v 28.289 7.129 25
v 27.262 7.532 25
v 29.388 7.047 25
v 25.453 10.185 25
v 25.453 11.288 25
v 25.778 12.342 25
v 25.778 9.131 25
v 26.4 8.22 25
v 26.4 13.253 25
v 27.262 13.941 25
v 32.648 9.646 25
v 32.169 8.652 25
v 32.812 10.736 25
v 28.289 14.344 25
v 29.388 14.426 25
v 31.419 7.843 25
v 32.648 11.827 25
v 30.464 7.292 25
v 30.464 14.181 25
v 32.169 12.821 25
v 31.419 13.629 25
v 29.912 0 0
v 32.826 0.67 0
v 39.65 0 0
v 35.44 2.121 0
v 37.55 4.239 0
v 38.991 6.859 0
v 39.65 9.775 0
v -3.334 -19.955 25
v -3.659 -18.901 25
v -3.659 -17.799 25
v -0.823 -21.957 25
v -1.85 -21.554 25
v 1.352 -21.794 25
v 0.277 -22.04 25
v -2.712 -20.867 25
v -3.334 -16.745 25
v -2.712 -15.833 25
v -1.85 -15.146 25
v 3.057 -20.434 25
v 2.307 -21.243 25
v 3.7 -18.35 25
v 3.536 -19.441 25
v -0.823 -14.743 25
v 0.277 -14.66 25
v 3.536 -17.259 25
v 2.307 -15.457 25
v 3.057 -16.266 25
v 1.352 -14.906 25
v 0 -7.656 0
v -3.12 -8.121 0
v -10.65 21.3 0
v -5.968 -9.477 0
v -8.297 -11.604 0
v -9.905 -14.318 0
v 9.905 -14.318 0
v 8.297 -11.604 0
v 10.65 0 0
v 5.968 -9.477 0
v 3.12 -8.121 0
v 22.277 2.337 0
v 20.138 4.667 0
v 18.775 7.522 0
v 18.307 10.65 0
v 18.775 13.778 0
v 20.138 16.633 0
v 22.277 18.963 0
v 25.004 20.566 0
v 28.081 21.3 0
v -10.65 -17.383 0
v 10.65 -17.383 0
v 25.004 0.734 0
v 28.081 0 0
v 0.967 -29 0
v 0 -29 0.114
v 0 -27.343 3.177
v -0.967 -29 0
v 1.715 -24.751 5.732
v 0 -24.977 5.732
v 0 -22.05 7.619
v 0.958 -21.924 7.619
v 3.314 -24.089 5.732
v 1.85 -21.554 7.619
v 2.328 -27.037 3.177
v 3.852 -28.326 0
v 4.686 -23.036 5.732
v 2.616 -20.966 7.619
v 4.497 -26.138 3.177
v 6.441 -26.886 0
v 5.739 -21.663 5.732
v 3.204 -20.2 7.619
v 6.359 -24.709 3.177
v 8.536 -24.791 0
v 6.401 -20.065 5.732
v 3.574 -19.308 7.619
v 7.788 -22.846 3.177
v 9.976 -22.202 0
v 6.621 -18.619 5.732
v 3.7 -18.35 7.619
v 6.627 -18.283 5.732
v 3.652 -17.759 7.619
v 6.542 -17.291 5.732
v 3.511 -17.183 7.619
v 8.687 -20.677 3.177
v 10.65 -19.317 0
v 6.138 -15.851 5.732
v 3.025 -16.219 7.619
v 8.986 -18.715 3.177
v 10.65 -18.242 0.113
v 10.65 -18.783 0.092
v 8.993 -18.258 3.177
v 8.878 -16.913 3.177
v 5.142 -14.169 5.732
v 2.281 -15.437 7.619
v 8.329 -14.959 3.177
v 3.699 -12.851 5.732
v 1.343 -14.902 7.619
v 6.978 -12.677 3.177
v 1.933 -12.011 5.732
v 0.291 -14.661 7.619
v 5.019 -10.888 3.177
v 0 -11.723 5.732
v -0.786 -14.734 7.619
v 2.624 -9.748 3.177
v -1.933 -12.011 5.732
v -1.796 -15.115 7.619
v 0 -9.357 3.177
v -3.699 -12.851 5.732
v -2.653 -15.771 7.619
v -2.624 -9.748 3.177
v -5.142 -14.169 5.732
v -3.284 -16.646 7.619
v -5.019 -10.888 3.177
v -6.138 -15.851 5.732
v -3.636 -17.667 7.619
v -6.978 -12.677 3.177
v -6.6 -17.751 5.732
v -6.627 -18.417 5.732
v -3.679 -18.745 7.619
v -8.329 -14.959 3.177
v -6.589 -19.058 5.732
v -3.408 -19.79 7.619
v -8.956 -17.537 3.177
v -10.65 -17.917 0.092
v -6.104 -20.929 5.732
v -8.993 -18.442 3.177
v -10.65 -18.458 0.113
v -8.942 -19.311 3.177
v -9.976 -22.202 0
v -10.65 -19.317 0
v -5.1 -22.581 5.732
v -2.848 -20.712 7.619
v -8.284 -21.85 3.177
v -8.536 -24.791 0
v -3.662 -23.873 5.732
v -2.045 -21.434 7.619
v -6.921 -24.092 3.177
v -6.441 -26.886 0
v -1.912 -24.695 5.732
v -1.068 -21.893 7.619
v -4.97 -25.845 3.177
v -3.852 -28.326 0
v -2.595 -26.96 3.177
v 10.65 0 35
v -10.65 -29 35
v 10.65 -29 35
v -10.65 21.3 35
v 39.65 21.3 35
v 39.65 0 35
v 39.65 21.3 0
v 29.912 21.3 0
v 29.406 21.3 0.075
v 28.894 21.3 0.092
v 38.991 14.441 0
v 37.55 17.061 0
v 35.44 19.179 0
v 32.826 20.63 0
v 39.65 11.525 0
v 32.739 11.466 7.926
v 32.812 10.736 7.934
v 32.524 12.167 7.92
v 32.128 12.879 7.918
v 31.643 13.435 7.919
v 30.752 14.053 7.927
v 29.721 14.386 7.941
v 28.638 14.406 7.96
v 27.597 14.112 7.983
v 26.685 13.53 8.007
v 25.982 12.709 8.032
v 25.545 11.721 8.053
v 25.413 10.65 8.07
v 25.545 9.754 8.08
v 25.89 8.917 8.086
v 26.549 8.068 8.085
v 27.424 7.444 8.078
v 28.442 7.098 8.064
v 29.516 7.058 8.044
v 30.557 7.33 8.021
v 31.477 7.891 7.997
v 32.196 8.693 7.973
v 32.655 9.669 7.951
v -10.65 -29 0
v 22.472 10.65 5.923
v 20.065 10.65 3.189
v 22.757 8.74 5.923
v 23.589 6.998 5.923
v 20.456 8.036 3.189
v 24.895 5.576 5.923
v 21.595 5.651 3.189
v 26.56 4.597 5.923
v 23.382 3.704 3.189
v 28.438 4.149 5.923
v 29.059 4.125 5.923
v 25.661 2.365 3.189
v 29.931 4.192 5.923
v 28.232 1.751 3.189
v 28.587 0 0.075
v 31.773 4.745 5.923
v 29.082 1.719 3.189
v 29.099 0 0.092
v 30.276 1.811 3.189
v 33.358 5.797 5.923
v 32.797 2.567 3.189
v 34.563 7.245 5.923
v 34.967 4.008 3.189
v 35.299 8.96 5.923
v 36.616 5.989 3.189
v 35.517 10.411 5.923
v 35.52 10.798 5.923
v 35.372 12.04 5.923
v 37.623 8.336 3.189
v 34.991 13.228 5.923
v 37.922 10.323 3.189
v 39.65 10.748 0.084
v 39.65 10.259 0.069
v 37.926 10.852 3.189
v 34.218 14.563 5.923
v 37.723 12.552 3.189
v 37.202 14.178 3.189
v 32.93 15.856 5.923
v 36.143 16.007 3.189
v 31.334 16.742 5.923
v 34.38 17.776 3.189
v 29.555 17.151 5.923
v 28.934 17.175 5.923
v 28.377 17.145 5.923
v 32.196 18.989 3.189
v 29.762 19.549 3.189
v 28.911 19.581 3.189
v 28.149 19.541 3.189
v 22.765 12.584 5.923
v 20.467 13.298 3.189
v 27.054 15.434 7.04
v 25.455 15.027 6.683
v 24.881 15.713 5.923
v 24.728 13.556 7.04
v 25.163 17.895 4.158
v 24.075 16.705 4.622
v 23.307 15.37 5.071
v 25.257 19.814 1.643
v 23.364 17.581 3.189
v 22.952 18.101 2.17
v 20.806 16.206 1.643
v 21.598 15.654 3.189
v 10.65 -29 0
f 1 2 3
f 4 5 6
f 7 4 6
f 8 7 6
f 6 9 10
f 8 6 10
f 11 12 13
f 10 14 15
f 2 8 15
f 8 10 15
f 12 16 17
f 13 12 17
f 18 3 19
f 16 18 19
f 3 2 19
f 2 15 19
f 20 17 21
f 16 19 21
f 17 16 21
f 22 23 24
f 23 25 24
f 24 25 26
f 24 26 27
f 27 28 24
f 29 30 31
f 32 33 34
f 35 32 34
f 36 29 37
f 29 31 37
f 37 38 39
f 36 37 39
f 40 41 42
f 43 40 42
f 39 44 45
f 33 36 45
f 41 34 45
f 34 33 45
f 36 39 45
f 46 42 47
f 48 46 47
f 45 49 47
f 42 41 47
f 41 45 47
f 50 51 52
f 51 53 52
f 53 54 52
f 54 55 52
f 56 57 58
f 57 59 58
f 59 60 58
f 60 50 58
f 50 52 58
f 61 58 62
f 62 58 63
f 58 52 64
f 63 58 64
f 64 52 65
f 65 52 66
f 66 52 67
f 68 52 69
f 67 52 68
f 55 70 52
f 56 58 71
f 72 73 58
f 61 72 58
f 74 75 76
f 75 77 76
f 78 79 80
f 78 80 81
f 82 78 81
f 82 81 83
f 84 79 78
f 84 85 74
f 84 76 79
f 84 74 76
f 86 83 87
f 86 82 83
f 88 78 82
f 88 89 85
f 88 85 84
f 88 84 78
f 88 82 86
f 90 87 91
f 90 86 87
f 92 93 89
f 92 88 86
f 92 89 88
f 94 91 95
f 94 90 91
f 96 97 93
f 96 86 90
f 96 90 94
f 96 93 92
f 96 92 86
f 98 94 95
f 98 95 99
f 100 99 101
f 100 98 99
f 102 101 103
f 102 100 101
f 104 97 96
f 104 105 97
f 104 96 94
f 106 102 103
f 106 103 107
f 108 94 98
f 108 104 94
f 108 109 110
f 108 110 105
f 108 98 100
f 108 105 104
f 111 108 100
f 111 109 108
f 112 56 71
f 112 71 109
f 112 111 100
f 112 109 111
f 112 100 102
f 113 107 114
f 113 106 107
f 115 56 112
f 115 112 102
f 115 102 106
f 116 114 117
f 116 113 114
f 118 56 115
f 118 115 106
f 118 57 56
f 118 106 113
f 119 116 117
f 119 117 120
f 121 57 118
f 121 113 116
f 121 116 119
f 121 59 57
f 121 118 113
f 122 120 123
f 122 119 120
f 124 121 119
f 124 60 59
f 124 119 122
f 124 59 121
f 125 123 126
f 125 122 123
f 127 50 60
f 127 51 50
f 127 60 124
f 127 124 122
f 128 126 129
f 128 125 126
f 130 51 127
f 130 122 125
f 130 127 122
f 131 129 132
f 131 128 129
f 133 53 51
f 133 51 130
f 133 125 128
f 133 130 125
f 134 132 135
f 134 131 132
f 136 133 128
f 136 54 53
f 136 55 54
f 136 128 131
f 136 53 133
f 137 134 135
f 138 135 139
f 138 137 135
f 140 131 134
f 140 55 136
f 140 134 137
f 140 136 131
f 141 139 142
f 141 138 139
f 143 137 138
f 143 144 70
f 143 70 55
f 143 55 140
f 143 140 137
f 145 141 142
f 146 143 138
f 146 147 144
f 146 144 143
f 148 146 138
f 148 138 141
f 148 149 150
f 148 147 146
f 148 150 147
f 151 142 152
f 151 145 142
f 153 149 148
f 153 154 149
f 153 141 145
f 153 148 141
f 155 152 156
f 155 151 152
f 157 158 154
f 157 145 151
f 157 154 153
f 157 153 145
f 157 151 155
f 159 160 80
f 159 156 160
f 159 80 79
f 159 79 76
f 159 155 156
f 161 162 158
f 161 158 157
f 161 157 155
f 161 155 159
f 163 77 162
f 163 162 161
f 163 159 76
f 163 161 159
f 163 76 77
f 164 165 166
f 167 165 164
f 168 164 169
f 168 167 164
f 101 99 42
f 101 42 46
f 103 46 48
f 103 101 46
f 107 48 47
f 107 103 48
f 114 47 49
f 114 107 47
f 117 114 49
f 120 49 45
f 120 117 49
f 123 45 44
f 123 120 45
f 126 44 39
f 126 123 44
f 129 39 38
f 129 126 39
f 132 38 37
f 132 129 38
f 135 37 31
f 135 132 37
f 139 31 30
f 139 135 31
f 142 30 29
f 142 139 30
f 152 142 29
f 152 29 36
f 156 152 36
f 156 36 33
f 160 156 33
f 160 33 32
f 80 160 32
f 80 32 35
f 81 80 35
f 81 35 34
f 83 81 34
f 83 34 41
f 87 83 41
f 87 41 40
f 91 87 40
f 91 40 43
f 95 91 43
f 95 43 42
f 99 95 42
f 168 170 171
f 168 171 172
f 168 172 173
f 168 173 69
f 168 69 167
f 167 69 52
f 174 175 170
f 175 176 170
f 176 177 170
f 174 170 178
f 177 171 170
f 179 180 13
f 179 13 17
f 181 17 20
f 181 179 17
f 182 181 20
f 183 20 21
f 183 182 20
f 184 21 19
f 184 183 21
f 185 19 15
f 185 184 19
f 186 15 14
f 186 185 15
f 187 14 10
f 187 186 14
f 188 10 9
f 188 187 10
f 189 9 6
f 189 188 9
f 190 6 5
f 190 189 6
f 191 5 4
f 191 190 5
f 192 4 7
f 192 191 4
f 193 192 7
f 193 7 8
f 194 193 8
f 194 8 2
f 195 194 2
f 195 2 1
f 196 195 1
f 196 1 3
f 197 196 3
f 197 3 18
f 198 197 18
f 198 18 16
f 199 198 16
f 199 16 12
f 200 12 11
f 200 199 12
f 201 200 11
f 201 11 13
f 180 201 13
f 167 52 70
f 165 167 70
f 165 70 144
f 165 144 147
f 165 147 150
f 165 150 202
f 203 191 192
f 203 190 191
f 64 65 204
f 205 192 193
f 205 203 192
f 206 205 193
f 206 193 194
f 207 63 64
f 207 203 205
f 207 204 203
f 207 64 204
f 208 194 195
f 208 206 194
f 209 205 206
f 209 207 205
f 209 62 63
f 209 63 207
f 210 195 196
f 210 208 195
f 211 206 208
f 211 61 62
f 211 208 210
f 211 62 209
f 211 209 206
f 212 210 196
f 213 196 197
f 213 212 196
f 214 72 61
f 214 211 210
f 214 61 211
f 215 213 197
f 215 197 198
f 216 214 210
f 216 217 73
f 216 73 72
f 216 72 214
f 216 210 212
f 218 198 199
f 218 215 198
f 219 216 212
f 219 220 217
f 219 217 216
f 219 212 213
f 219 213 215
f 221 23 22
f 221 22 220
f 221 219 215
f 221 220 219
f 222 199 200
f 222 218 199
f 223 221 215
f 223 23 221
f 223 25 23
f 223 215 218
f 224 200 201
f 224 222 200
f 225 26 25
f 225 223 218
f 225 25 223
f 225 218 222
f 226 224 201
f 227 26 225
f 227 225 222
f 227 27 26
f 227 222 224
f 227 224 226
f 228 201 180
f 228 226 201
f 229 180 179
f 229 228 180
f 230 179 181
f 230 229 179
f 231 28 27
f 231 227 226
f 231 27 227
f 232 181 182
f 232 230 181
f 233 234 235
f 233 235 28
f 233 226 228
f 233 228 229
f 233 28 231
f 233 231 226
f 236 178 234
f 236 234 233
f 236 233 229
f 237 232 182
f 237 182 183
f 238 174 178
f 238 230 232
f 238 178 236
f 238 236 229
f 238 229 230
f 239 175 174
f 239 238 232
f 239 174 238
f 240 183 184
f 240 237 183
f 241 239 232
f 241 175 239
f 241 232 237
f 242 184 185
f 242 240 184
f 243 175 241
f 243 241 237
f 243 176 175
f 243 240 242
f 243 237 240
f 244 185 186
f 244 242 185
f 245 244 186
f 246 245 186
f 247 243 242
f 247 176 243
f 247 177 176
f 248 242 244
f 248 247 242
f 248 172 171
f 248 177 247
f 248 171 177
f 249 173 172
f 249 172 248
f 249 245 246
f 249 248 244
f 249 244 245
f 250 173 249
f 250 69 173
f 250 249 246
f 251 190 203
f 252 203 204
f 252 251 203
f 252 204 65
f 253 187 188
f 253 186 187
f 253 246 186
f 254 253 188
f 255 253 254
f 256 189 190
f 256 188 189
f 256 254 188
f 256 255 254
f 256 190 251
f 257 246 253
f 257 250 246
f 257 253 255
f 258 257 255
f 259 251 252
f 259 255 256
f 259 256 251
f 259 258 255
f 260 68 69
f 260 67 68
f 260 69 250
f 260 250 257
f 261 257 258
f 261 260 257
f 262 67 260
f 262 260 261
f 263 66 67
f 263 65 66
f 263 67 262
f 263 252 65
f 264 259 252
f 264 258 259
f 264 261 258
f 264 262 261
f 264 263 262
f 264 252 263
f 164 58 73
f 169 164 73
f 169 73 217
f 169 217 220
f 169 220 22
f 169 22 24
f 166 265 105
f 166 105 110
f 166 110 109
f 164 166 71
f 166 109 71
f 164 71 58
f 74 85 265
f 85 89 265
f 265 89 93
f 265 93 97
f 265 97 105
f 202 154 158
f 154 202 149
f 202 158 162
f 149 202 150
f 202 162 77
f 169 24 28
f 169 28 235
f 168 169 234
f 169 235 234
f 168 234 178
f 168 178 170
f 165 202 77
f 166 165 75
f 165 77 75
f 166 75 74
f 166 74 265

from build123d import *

# Parameters (mm, degrees)
F0_W     = 10.65
F0_H     = 10.7820915088
F0_H_2   = 10.5179084912
F1_DEPTH = 35
F5_R     = 3.7
F6_DEPTH = 25
F7_R     = 3.7
F8_DEPTH = 25


with BuildPart() as f1:
    # F0 (on Top) → F1 (new body)
    with BuildSketch(Plane.XY):
        with Locations((-5.325, 15.9089542456)):
            Rectangle(F0_W, F0_H)
        with Locations((5.325, 15.9089542456)):
            Rectangle(F0_W, F0_H)
        with BuildLine():
            Line((28.999999983, 21.3), (10.65, 21.3))
            Line((10.65, 21.3), (10.65, 10.5179084912))
            Line((10.65, 10.5179084912), (18.3508191943, 10.5179084912))
            ThreePointArc((18.3508191943, 10.5179084912), (21.4227552913, 18.1338400989), (28.999999983, 21.3))
        make_face()
        with BuildLine():
            Line((39.65, 21.3), (28.999999983, 21.3))
            ThreePointArc((28.999999983, 21.3), (36.5306872136, 18.1806872257), (39.65, 10.65))
            Line((39.65, 10.65), (39.65, 21.3))
        make_face()
        with BuildLine():
            Line((39.65, 0), (39.65, 10.65))
            ThreePointArc((39.65, 10.65), (36.5306872196, 3.1193127804), (29, 0))
            Line((29, 0), (39.65, 0))
        make_face()
        with BuildLine():
            Line((18.3508191943, 10.5179084912), (10.65, 10.5179084912))
            Line((10.65, 10.5179084912), (10.65, 0))
            Line((10.65, 0), (29, 0))
            ThreePointArc((29, 0), (21.5161598951, 3.0727552973), (18.3508191943, 10.5179084912))
        make_face()
        with Locations((5.325, 5.2589542456)):
            Rectangle(F0_W, F0_H_2)
        with Locations((-5.325, 5.2589542456)):
            Rectangle(F0_W, F0_H_2)
        with BuildLine():
            Line((0, 0), (-10.65, 0))
            Line((-10.65, 0), (-10.65, -18.3500000446))
            ThreePointArc((-10.65, -18.3500000446), (-7.5306872354, -10.8193127961), (0, -7.7))
            Line((0, -7.7), (0, 0))
        make_face()
        with BuildLine():
            Line((10.65, 0), (0, 0))
            Line((0, 0), (0, -7.7))
            ThreePointArc((0, -7.7), (7.5306872196, -10.8193127804), (10.65, -18.35))
            Line((10.65, -18.35), (10.65, 0))
        make_face()
        with BuildLine():
            ThreePointArc((0, -29), (-7.5306872039, -25.8806872354), (-10.65, -18.3500000446))
            Line((-10.65, -18.3500000446), (-10.65, -29))
            Line((-10.65, -29), (0, -29))
        make_face()
        with BuildLine():
            ThreePointArc((10.65, -18.35), (7.5306872196, -25.8806872196), (0, -29))
            Line((0, -29), (10.65, -29))
            Line((10.65, -29), (10.65, -18.35))
        make_face()
        with BuildLine():
            ThreePointArc((0, -7.7), (-7.5306872354, -10.8193127961), (-10.65, -18.3500000446))
            ThreePointArc((-10.65, -18.3500000446), (-7.5306872039, -25.8806872354), (0, -29))
            ThreePointArc((0, -29), (7.5306872196, -25.8806872196), (10.65, -18.35))
            ThreePointArc((10.65, -18.35), (7.5306872196, -10.8193127804), (0, -7.7))
        make_face()
        with BuildLine():
            ThreePointArc((39.65, 10.65), (36.5306872136, 18.1806872257), (28.999999983, 21.3))
            ThreePointArc((28.999999983, 21.3), (21.4227552913, 18.1338400989), (18.3508191943, 10.5179084912))
            ThreePointArc((18.3508191943, 10.5179084912), (21.5161598951, 3.0727552973), (29, 0))
            ThreePointArc((29, 0), (36.5306872196, 3.1193127804), (39.65, 10.65))
        make_face()
    extrude(amount=F1_DEPTH)

    # F2 (on Right) → F3 (revolve, cut)
    with BuildSketch(Plane.YZ):
        with BuildLine():
            Line((-18.35, 0), (-18.35, 8.7915472686))
            ThreePointArc((-18.35, 8.7915472686), (-24.8692408708, 5.8217661701), (-29.0438234806, 0))
            Line((-29.0438234806, 0), (-18.35, 0))
        make_face()
    revolve(axis=Axis((0, -18.35, 6.2414296837), (0, 0, 1)), mode=Mode.SUBTRACT)

    # F5 (on Top) → F6 (cut)
    with BuildSketch(Plane.XY):
        with Locations((0, -18.35)):
            Circle(F5_R)
    extrude(amount=F6_DEPTH, mode=Mode.SUBTRACT)

    # F7 (on Top) → F8 (cut)
    with BuildSketch(Plane.XY):
        with Locations((29.1118938476, 10.736274533)):
            Circle(F7_R)
    extrude(amount=F8_DEPTH, mode=Mode.SUBTRACT)

    # F9 (on offset) → F10 (revolve, cut)
    with BuildSketch(Plane.XZ.offset(-10.65)):
        with BuildLine():
            Line((18.3073151857, 0), (28.9965979755, 0))
            Line((28.9965979755, 0), (28.9965979755, 9.6057383344))
            ThreePointArc((28.9965979755, 9.6057383344), (22.567565814, 6.0095811507), (18.3073151857, 0))
        make_face()
    revolve(axis=Axis((28.9965979755, 10.65, 11.7063857615), (0, 0, 1)), mode=Mode.SUBTRACT)


solid = f1.part
